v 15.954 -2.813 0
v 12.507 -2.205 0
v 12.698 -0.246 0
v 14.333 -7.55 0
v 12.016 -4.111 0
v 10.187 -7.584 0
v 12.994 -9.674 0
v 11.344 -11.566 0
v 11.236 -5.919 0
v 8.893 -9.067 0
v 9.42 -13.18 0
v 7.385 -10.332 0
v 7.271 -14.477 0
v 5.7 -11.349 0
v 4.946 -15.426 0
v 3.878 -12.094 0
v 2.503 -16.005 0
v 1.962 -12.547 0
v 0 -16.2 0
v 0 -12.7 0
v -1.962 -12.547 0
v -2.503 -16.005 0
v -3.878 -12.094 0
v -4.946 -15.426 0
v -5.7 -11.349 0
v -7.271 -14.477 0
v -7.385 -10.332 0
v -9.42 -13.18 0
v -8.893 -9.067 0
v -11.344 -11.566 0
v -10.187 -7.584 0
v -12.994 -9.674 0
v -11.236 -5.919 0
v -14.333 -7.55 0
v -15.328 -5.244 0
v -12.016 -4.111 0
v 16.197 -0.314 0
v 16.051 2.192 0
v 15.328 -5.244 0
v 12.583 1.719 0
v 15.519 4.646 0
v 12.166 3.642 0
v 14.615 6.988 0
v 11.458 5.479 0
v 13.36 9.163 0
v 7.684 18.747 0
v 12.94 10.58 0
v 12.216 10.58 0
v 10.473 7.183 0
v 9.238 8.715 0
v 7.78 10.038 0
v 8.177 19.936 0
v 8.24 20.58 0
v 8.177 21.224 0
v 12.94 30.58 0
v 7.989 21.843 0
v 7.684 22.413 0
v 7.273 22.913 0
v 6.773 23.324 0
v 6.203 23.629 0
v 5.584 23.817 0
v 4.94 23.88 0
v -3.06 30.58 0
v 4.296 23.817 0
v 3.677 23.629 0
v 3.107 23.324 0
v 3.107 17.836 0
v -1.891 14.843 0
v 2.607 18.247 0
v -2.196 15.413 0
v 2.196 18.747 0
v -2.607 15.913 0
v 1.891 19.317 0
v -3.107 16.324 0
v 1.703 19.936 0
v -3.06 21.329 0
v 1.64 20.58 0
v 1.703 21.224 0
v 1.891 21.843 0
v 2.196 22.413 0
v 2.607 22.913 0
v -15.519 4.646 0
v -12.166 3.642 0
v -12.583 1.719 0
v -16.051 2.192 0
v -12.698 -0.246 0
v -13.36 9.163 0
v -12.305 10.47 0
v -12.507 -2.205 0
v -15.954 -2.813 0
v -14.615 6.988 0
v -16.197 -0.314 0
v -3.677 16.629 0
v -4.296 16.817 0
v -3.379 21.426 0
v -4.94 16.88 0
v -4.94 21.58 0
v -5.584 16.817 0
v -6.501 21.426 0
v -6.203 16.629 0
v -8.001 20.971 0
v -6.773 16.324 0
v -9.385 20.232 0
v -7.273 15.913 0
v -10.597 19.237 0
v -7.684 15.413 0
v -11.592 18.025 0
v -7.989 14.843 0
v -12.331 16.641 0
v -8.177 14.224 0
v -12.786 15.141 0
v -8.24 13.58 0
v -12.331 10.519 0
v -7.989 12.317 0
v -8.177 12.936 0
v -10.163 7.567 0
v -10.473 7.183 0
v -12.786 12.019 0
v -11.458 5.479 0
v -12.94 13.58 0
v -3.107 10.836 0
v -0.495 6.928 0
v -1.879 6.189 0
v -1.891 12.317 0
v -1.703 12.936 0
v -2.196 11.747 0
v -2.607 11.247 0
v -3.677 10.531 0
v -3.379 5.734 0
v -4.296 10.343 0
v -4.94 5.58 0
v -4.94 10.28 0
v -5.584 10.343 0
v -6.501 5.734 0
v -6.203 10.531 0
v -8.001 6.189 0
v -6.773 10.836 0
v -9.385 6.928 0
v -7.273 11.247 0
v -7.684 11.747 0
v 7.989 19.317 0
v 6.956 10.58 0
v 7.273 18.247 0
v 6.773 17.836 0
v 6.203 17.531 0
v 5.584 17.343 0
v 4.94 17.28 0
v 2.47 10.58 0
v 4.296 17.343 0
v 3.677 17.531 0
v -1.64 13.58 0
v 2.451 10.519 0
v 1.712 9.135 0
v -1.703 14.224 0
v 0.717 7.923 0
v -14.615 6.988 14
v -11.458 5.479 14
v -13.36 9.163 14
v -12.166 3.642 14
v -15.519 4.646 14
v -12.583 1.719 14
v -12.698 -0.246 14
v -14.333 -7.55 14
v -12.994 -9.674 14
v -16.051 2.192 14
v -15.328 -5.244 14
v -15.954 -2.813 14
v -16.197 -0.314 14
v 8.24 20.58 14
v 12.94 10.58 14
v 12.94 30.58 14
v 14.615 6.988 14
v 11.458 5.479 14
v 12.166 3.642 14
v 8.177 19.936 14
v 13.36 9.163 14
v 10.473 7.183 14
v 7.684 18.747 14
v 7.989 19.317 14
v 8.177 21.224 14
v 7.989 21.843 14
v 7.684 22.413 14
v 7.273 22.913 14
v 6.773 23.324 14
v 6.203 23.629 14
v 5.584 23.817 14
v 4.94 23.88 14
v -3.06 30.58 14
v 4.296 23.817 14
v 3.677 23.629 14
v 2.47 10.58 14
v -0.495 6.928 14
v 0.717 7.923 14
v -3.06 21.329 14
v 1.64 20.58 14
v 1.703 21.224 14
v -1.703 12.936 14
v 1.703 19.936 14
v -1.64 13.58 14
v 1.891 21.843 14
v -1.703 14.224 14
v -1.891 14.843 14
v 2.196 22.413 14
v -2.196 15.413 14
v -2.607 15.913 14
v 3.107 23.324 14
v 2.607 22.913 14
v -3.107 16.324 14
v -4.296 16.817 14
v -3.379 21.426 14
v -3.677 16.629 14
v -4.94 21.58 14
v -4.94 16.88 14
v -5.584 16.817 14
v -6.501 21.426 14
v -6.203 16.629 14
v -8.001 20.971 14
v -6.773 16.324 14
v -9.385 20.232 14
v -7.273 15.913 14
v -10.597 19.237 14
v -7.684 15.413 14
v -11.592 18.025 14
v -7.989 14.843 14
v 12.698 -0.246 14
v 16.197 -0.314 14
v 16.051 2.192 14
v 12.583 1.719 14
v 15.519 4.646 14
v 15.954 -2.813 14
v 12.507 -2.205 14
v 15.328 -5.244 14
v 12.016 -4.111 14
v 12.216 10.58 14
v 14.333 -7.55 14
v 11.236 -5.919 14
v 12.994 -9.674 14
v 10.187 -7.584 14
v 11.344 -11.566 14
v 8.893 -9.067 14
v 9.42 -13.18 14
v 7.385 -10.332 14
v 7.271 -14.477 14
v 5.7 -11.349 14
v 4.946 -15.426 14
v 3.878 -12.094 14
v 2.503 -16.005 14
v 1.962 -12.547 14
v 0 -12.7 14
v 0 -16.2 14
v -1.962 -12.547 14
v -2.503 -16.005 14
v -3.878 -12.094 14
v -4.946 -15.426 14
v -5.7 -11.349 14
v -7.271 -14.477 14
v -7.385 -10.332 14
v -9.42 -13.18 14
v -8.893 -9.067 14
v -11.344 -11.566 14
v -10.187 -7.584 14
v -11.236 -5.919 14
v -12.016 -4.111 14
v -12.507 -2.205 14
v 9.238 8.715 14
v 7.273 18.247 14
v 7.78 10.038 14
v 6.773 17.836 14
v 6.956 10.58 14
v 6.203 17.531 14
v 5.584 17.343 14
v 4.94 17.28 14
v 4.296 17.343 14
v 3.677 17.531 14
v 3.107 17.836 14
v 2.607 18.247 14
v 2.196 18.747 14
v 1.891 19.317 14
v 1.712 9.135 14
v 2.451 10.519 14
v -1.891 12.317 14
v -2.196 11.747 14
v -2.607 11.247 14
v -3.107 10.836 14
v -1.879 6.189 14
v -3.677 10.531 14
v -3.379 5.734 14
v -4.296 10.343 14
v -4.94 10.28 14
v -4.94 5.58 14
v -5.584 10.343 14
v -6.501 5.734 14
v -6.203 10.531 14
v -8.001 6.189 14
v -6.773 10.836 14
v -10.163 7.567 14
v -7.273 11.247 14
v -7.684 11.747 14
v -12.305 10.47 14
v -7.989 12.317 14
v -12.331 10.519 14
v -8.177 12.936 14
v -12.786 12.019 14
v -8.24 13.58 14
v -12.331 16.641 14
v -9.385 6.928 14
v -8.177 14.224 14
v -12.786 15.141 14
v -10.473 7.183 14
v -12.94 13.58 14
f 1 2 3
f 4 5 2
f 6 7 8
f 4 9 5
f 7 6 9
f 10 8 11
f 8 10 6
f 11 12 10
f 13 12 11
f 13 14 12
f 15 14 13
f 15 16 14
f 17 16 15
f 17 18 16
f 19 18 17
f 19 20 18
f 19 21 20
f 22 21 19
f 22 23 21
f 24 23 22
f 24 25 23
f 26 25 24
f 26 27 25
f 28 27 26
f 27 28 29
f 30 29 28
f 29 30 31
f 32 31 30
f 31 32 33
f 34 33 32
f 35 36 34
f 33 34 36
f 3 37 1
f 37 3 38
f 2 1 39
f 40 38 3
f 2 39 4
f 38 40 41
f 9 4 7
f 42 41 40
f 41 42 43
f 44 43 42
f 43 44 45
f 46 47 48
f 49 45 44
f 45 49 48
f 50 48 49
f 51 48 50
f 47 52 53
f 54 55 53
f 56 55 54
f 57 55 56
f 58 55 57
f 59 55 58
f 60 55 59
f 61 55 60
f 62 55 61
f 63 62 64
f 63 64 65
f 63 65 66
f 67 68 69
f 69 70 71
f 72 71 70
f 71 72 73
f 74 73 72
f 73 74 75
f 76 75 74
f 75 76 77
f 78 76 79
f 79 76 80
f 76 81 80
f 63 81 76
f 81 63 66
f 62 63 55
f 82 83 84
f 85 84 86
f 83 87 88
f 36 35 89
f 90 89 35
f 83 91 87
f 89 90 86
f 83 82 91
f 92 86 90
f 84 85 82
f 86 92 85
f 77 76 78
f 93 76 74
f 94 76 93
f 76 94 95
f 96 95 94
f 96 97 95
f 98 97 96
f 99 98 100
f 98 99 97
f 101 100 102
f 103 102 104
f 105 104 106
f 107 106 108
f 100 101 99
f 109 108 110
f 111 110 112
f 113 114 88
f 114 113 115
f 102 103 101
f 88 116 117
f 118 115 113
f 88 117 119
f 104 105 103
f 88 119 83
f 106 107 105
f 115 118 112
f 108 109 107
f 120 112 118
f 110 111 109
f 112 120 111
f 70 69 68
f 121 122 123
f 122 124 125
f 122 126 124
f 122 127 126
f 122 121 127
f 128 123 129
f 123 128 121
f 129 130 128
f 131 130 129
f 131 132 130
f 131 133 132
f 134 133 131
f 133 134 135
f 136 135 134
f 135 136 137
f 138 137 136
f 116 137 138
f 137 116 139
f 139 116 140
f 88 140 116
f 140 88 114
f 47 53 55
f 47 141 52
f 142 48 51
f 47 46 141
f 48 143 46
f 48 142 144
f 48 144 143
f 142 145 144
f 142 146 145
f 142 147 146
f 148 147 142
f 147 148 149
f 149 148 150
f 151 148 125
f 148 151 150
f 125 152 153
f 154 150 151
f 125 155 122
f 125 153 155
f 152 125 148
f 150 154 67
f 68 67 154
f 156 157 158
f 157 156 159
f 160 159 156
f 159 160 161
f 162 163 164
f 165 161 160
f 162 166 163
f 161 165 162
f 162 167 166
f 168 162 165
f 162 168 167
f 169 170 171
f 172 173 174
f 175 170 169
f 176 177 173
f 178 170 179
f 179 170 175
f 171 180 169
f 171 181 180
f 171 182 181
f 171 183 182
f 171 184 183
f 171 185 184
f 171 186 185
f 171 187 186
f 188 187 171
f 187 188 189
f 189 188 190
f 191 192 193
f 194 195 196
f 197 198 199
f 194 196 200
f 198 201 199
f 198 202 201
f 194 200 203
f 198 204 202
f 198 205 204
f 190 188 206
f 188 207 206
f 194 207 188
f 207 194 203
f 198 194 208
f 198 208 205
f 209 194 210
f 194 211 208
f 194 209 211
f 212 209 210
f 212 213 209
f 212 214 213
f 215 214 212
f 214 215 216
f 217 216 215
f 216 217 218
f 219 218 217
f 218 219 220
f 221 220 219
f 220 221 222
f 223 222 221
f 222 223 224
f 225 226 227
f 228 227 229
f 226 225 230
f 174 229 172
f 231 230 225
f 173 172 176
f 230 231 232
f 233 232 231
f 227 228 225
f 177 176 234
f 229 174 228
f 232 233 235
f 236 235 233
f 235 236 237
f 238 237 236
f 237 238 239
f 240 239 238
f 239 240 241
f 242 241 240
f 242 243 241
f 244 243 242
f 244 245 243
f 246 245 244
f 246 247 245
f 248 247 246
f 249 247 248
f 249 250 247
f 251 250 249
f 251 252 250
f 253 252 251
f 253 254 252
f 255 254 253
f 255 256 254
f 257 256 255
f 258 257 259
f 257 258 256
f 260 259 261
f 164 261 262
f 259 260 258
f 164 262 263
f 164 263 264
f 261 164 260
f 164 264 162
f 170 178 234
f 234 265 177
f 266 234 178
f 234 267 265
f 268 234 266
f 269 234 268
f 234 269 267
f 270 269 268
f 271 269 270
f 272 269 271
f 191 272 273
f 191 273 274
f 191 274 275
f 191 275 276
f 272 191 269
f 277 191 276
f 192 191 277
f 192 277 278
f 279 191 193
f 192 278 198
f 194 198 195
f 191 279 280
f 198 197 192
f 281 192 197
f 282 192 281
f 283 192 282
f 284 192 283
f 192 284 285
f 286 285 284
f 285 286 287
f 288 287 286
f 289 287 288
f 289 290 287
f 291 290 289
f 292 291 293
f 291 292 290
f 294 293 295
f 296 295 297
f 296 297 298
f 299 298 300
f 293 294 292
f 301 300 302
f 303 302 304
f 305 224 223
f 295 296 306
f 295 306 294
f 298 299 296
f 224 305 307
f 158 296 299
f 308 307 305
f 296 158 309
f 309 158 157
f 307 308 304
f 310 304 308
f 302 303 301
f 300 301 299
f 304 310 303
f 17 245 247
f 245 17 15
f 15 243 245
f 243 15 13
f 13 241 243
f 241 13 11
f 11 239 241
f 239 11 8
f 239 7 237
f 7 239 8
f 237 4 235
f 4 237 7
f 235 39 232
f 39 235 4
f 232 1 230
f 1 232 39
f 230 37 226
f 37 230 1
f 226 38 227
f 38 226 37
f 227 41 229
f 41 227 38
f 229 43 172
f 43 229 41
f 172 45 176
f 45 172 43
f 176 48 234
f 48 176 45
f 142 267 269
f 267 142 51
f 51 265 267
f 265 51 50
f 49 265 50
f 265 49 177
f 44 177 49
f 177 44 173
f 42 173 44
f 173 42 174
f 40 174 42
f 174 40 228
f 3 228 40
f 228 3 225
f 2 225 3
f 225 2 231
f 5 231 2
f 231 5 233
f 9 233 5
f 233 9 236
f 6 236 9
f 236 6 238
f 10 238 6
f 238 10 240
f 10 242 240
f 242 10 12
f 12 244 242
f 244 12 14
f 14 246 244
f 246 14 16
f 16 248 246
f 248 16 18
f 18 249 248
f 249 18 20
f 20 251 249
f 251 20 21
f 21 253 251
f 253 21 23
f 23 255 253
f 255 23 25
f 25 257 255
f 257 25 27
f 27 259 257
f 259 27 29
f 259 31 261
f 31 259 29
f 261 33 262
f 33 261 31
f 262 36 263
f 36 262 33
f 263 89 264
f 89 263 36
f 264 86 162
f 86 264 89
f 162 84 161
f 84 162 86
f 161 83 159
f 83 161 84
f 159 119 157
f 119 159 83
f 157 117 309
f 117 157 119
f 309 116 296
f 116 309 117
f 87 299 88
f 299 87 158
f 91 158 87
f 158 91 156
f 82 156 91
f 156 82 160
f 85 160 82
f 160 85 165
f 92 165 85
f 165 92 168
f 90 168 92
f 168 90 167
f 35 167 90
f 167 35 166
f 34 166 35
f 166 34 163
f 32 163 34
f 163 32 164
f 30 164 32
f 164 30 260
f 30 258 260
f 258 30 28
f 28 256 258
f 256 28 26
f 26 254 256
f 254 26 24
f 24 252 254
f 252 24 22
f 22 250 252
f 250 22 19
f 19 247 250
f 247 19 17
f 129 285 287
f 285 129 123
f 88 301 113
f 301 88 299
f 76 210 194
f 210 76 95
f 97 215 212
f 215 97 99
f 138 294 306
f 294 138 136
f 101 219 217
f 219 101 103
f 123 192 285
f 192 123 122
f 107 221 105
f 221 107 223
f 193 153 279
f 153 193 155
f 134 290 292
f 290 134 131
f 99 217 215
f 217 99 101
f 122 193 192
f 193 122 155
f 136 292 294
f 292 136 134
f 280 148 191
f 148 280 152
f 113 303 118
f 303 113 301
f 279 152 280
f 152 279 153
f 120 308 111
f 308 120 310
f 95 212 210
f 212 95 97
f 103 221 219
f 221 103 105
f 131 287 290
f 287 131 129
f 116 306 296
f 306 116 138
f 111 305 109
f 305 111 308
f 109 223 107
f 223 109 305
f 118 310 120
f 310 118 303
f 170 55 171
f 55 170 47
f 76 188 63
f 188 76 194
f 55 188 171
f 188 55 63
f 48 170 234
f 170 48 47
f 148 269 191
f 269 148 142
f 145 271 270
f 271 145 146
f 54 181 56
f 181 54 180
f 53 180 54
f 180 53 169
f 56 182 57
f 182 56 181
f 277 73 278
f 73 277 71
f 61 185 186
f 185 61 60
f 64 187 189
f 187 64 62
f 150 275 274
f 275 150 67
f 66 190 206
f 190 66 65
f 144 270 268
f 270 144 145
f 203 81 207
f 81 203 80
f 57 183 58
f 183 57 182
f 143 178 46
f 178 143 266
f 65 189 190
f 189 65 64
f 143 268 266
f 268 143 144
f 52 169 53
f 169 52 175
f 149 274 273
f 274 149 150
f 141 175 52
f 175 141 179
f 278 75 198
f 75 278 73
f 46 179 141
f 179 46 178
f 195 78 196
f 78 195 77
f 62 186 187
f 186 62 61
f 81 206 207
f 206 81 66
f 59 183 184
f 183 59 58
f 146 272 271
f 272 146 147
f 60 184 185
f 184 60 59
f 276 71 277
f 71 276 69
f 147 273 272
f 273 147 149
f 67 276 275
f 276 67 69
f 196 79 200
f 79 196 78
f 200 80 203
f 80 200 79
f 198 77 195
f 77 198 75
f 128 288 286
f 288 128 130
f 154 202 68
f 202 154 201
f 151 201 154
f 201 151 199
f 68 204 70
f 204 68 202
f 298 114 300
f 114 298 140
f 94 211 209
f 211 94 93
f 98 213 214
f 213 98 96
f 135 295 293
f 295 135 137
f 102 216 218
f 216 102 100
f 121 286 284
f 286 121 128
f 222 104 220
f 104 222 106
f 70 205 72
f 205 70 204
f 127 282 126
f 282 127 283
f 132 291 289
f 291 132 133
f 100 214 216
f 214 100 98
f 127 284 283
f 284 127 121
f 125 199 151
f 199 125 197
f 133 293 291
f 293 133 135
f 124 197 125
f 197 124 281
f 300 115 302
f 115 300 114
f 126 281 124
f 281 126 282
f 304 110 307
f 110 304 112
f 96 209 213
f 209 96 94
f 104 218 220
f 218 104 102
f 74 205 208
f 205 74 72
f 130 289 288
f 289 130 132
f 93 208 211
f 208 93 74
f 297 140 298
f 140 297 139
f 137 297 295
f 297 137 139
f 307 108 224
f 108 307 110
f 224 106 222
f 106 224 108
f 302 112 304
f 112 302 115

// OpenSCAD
$fn = 32;
// ----------------------------------------------------------------------
// Pipe clamp: 32.4 mm ring, 3.5 mm wall, 14 mm wide
// ----------------------------------------------------------------------

// --- parameters (mm) ---
outer_r = 16.2;           // clamp outside radius
inner_r = 12.7;           // pipe bore radius
band = 3.5;               // band thickness
clamp_w = 14;             // clamp width
opening = 40;             // opening angle between the ends
lug_w = 16;               // lug width
lug_len = 20;             // lug length
bolt_d = 6.6;             // bolt hole
knuckle_d = 16;           // hinge knuckle diameter
pin_d = 6.6;              // hinge pin hole

clamp_profile = [[-5.541, 15.223], [-7.826, 14.184], [-9.924, 12.804], [-11.783, 11.117], [-13.36, 9.163], [-14.615, 6.988], [-15.519, 4.646], [-16.051, 2.192], [-16.197, -0.314], [-15.954, -2.813], [-15.328, -5.244], [-14.333, -7.55], [-12.994, -9.674], [-11.344, -11.566], [-9.42, -13.18], [-7.271, -14.477], [-4.946, -15.426], [-2.503, -16.005], [0, -16.2], [2.503, -16.005], [4.946, -15.426], [7.271, -14.477], [9.42, -13.18], [11.344, -11.566], [12.994, -9.674], [14.333, -7.55], [15.328, -5.244], [15.954, -2.813], [16.197, -0.314], [16.051, 2.192], [15.519, 4.646], [14.615, 6.988], [13.36, 9.163], [11.783, 11.117], [9.924, 12.804], [7.826, 14.184], [5.541, 15.223], [4.344, 11.934], [6.136, 11.12], [7.78, 10.038], [9.238, 8.715], [10.473, 7.183], [11.458, 5.479], [12.166, 3.642], [12.583, 1.719], [12.698, -0.246], [12.507, -2.205], [12.016, -4.111], [11.236, -5.919], [10.187, -7.584], [8.893, -9.067], [7.385, -10.332], [5.7, -11.349], [3.878, -12.094], [1.962, -12.547], [0, -12.7], [-1.962, -12.547], [-3.878, -12.094], [-5.7, -11.349], [-7.385, -10.332], [-8.893, -9.067], [-10.187, -7.584], [-11.236, -5.919], [-12.016, -4.111], [-12.507, -2.205], [-12.698, -0.246], [-12.583, 1.719], [-12.166, 3.642], [-11.458, 5.479], [-10.473, 7.183], [-9.238, 8.715], [-7.78, 10.038], [-6.136, 11.12], [-4.344, 11.934]];

difference() {
  union() {
    linear_extrude(height = clamp_w) polygon(clamp_profile);
    /* hinge knuckle, sunk 2 mm into the band end */
    translate([-4.94, 13.58, 0]) cylinder(h = clamp_w, d = knuckle_d);
    /* bolt lug on the other end */
    translate([-3.06, 10.58, 0]) cube([lug_w, 20, clamp_w]);
  }
  translate([4.94, 20.58, -2.5]) cylinder(h = clamp_w + 5, d = bolt_d);
  translate([-4.94, 13.58, -2.5]) cylinder(h = clamp_w + 5, d = pin_d);
}
